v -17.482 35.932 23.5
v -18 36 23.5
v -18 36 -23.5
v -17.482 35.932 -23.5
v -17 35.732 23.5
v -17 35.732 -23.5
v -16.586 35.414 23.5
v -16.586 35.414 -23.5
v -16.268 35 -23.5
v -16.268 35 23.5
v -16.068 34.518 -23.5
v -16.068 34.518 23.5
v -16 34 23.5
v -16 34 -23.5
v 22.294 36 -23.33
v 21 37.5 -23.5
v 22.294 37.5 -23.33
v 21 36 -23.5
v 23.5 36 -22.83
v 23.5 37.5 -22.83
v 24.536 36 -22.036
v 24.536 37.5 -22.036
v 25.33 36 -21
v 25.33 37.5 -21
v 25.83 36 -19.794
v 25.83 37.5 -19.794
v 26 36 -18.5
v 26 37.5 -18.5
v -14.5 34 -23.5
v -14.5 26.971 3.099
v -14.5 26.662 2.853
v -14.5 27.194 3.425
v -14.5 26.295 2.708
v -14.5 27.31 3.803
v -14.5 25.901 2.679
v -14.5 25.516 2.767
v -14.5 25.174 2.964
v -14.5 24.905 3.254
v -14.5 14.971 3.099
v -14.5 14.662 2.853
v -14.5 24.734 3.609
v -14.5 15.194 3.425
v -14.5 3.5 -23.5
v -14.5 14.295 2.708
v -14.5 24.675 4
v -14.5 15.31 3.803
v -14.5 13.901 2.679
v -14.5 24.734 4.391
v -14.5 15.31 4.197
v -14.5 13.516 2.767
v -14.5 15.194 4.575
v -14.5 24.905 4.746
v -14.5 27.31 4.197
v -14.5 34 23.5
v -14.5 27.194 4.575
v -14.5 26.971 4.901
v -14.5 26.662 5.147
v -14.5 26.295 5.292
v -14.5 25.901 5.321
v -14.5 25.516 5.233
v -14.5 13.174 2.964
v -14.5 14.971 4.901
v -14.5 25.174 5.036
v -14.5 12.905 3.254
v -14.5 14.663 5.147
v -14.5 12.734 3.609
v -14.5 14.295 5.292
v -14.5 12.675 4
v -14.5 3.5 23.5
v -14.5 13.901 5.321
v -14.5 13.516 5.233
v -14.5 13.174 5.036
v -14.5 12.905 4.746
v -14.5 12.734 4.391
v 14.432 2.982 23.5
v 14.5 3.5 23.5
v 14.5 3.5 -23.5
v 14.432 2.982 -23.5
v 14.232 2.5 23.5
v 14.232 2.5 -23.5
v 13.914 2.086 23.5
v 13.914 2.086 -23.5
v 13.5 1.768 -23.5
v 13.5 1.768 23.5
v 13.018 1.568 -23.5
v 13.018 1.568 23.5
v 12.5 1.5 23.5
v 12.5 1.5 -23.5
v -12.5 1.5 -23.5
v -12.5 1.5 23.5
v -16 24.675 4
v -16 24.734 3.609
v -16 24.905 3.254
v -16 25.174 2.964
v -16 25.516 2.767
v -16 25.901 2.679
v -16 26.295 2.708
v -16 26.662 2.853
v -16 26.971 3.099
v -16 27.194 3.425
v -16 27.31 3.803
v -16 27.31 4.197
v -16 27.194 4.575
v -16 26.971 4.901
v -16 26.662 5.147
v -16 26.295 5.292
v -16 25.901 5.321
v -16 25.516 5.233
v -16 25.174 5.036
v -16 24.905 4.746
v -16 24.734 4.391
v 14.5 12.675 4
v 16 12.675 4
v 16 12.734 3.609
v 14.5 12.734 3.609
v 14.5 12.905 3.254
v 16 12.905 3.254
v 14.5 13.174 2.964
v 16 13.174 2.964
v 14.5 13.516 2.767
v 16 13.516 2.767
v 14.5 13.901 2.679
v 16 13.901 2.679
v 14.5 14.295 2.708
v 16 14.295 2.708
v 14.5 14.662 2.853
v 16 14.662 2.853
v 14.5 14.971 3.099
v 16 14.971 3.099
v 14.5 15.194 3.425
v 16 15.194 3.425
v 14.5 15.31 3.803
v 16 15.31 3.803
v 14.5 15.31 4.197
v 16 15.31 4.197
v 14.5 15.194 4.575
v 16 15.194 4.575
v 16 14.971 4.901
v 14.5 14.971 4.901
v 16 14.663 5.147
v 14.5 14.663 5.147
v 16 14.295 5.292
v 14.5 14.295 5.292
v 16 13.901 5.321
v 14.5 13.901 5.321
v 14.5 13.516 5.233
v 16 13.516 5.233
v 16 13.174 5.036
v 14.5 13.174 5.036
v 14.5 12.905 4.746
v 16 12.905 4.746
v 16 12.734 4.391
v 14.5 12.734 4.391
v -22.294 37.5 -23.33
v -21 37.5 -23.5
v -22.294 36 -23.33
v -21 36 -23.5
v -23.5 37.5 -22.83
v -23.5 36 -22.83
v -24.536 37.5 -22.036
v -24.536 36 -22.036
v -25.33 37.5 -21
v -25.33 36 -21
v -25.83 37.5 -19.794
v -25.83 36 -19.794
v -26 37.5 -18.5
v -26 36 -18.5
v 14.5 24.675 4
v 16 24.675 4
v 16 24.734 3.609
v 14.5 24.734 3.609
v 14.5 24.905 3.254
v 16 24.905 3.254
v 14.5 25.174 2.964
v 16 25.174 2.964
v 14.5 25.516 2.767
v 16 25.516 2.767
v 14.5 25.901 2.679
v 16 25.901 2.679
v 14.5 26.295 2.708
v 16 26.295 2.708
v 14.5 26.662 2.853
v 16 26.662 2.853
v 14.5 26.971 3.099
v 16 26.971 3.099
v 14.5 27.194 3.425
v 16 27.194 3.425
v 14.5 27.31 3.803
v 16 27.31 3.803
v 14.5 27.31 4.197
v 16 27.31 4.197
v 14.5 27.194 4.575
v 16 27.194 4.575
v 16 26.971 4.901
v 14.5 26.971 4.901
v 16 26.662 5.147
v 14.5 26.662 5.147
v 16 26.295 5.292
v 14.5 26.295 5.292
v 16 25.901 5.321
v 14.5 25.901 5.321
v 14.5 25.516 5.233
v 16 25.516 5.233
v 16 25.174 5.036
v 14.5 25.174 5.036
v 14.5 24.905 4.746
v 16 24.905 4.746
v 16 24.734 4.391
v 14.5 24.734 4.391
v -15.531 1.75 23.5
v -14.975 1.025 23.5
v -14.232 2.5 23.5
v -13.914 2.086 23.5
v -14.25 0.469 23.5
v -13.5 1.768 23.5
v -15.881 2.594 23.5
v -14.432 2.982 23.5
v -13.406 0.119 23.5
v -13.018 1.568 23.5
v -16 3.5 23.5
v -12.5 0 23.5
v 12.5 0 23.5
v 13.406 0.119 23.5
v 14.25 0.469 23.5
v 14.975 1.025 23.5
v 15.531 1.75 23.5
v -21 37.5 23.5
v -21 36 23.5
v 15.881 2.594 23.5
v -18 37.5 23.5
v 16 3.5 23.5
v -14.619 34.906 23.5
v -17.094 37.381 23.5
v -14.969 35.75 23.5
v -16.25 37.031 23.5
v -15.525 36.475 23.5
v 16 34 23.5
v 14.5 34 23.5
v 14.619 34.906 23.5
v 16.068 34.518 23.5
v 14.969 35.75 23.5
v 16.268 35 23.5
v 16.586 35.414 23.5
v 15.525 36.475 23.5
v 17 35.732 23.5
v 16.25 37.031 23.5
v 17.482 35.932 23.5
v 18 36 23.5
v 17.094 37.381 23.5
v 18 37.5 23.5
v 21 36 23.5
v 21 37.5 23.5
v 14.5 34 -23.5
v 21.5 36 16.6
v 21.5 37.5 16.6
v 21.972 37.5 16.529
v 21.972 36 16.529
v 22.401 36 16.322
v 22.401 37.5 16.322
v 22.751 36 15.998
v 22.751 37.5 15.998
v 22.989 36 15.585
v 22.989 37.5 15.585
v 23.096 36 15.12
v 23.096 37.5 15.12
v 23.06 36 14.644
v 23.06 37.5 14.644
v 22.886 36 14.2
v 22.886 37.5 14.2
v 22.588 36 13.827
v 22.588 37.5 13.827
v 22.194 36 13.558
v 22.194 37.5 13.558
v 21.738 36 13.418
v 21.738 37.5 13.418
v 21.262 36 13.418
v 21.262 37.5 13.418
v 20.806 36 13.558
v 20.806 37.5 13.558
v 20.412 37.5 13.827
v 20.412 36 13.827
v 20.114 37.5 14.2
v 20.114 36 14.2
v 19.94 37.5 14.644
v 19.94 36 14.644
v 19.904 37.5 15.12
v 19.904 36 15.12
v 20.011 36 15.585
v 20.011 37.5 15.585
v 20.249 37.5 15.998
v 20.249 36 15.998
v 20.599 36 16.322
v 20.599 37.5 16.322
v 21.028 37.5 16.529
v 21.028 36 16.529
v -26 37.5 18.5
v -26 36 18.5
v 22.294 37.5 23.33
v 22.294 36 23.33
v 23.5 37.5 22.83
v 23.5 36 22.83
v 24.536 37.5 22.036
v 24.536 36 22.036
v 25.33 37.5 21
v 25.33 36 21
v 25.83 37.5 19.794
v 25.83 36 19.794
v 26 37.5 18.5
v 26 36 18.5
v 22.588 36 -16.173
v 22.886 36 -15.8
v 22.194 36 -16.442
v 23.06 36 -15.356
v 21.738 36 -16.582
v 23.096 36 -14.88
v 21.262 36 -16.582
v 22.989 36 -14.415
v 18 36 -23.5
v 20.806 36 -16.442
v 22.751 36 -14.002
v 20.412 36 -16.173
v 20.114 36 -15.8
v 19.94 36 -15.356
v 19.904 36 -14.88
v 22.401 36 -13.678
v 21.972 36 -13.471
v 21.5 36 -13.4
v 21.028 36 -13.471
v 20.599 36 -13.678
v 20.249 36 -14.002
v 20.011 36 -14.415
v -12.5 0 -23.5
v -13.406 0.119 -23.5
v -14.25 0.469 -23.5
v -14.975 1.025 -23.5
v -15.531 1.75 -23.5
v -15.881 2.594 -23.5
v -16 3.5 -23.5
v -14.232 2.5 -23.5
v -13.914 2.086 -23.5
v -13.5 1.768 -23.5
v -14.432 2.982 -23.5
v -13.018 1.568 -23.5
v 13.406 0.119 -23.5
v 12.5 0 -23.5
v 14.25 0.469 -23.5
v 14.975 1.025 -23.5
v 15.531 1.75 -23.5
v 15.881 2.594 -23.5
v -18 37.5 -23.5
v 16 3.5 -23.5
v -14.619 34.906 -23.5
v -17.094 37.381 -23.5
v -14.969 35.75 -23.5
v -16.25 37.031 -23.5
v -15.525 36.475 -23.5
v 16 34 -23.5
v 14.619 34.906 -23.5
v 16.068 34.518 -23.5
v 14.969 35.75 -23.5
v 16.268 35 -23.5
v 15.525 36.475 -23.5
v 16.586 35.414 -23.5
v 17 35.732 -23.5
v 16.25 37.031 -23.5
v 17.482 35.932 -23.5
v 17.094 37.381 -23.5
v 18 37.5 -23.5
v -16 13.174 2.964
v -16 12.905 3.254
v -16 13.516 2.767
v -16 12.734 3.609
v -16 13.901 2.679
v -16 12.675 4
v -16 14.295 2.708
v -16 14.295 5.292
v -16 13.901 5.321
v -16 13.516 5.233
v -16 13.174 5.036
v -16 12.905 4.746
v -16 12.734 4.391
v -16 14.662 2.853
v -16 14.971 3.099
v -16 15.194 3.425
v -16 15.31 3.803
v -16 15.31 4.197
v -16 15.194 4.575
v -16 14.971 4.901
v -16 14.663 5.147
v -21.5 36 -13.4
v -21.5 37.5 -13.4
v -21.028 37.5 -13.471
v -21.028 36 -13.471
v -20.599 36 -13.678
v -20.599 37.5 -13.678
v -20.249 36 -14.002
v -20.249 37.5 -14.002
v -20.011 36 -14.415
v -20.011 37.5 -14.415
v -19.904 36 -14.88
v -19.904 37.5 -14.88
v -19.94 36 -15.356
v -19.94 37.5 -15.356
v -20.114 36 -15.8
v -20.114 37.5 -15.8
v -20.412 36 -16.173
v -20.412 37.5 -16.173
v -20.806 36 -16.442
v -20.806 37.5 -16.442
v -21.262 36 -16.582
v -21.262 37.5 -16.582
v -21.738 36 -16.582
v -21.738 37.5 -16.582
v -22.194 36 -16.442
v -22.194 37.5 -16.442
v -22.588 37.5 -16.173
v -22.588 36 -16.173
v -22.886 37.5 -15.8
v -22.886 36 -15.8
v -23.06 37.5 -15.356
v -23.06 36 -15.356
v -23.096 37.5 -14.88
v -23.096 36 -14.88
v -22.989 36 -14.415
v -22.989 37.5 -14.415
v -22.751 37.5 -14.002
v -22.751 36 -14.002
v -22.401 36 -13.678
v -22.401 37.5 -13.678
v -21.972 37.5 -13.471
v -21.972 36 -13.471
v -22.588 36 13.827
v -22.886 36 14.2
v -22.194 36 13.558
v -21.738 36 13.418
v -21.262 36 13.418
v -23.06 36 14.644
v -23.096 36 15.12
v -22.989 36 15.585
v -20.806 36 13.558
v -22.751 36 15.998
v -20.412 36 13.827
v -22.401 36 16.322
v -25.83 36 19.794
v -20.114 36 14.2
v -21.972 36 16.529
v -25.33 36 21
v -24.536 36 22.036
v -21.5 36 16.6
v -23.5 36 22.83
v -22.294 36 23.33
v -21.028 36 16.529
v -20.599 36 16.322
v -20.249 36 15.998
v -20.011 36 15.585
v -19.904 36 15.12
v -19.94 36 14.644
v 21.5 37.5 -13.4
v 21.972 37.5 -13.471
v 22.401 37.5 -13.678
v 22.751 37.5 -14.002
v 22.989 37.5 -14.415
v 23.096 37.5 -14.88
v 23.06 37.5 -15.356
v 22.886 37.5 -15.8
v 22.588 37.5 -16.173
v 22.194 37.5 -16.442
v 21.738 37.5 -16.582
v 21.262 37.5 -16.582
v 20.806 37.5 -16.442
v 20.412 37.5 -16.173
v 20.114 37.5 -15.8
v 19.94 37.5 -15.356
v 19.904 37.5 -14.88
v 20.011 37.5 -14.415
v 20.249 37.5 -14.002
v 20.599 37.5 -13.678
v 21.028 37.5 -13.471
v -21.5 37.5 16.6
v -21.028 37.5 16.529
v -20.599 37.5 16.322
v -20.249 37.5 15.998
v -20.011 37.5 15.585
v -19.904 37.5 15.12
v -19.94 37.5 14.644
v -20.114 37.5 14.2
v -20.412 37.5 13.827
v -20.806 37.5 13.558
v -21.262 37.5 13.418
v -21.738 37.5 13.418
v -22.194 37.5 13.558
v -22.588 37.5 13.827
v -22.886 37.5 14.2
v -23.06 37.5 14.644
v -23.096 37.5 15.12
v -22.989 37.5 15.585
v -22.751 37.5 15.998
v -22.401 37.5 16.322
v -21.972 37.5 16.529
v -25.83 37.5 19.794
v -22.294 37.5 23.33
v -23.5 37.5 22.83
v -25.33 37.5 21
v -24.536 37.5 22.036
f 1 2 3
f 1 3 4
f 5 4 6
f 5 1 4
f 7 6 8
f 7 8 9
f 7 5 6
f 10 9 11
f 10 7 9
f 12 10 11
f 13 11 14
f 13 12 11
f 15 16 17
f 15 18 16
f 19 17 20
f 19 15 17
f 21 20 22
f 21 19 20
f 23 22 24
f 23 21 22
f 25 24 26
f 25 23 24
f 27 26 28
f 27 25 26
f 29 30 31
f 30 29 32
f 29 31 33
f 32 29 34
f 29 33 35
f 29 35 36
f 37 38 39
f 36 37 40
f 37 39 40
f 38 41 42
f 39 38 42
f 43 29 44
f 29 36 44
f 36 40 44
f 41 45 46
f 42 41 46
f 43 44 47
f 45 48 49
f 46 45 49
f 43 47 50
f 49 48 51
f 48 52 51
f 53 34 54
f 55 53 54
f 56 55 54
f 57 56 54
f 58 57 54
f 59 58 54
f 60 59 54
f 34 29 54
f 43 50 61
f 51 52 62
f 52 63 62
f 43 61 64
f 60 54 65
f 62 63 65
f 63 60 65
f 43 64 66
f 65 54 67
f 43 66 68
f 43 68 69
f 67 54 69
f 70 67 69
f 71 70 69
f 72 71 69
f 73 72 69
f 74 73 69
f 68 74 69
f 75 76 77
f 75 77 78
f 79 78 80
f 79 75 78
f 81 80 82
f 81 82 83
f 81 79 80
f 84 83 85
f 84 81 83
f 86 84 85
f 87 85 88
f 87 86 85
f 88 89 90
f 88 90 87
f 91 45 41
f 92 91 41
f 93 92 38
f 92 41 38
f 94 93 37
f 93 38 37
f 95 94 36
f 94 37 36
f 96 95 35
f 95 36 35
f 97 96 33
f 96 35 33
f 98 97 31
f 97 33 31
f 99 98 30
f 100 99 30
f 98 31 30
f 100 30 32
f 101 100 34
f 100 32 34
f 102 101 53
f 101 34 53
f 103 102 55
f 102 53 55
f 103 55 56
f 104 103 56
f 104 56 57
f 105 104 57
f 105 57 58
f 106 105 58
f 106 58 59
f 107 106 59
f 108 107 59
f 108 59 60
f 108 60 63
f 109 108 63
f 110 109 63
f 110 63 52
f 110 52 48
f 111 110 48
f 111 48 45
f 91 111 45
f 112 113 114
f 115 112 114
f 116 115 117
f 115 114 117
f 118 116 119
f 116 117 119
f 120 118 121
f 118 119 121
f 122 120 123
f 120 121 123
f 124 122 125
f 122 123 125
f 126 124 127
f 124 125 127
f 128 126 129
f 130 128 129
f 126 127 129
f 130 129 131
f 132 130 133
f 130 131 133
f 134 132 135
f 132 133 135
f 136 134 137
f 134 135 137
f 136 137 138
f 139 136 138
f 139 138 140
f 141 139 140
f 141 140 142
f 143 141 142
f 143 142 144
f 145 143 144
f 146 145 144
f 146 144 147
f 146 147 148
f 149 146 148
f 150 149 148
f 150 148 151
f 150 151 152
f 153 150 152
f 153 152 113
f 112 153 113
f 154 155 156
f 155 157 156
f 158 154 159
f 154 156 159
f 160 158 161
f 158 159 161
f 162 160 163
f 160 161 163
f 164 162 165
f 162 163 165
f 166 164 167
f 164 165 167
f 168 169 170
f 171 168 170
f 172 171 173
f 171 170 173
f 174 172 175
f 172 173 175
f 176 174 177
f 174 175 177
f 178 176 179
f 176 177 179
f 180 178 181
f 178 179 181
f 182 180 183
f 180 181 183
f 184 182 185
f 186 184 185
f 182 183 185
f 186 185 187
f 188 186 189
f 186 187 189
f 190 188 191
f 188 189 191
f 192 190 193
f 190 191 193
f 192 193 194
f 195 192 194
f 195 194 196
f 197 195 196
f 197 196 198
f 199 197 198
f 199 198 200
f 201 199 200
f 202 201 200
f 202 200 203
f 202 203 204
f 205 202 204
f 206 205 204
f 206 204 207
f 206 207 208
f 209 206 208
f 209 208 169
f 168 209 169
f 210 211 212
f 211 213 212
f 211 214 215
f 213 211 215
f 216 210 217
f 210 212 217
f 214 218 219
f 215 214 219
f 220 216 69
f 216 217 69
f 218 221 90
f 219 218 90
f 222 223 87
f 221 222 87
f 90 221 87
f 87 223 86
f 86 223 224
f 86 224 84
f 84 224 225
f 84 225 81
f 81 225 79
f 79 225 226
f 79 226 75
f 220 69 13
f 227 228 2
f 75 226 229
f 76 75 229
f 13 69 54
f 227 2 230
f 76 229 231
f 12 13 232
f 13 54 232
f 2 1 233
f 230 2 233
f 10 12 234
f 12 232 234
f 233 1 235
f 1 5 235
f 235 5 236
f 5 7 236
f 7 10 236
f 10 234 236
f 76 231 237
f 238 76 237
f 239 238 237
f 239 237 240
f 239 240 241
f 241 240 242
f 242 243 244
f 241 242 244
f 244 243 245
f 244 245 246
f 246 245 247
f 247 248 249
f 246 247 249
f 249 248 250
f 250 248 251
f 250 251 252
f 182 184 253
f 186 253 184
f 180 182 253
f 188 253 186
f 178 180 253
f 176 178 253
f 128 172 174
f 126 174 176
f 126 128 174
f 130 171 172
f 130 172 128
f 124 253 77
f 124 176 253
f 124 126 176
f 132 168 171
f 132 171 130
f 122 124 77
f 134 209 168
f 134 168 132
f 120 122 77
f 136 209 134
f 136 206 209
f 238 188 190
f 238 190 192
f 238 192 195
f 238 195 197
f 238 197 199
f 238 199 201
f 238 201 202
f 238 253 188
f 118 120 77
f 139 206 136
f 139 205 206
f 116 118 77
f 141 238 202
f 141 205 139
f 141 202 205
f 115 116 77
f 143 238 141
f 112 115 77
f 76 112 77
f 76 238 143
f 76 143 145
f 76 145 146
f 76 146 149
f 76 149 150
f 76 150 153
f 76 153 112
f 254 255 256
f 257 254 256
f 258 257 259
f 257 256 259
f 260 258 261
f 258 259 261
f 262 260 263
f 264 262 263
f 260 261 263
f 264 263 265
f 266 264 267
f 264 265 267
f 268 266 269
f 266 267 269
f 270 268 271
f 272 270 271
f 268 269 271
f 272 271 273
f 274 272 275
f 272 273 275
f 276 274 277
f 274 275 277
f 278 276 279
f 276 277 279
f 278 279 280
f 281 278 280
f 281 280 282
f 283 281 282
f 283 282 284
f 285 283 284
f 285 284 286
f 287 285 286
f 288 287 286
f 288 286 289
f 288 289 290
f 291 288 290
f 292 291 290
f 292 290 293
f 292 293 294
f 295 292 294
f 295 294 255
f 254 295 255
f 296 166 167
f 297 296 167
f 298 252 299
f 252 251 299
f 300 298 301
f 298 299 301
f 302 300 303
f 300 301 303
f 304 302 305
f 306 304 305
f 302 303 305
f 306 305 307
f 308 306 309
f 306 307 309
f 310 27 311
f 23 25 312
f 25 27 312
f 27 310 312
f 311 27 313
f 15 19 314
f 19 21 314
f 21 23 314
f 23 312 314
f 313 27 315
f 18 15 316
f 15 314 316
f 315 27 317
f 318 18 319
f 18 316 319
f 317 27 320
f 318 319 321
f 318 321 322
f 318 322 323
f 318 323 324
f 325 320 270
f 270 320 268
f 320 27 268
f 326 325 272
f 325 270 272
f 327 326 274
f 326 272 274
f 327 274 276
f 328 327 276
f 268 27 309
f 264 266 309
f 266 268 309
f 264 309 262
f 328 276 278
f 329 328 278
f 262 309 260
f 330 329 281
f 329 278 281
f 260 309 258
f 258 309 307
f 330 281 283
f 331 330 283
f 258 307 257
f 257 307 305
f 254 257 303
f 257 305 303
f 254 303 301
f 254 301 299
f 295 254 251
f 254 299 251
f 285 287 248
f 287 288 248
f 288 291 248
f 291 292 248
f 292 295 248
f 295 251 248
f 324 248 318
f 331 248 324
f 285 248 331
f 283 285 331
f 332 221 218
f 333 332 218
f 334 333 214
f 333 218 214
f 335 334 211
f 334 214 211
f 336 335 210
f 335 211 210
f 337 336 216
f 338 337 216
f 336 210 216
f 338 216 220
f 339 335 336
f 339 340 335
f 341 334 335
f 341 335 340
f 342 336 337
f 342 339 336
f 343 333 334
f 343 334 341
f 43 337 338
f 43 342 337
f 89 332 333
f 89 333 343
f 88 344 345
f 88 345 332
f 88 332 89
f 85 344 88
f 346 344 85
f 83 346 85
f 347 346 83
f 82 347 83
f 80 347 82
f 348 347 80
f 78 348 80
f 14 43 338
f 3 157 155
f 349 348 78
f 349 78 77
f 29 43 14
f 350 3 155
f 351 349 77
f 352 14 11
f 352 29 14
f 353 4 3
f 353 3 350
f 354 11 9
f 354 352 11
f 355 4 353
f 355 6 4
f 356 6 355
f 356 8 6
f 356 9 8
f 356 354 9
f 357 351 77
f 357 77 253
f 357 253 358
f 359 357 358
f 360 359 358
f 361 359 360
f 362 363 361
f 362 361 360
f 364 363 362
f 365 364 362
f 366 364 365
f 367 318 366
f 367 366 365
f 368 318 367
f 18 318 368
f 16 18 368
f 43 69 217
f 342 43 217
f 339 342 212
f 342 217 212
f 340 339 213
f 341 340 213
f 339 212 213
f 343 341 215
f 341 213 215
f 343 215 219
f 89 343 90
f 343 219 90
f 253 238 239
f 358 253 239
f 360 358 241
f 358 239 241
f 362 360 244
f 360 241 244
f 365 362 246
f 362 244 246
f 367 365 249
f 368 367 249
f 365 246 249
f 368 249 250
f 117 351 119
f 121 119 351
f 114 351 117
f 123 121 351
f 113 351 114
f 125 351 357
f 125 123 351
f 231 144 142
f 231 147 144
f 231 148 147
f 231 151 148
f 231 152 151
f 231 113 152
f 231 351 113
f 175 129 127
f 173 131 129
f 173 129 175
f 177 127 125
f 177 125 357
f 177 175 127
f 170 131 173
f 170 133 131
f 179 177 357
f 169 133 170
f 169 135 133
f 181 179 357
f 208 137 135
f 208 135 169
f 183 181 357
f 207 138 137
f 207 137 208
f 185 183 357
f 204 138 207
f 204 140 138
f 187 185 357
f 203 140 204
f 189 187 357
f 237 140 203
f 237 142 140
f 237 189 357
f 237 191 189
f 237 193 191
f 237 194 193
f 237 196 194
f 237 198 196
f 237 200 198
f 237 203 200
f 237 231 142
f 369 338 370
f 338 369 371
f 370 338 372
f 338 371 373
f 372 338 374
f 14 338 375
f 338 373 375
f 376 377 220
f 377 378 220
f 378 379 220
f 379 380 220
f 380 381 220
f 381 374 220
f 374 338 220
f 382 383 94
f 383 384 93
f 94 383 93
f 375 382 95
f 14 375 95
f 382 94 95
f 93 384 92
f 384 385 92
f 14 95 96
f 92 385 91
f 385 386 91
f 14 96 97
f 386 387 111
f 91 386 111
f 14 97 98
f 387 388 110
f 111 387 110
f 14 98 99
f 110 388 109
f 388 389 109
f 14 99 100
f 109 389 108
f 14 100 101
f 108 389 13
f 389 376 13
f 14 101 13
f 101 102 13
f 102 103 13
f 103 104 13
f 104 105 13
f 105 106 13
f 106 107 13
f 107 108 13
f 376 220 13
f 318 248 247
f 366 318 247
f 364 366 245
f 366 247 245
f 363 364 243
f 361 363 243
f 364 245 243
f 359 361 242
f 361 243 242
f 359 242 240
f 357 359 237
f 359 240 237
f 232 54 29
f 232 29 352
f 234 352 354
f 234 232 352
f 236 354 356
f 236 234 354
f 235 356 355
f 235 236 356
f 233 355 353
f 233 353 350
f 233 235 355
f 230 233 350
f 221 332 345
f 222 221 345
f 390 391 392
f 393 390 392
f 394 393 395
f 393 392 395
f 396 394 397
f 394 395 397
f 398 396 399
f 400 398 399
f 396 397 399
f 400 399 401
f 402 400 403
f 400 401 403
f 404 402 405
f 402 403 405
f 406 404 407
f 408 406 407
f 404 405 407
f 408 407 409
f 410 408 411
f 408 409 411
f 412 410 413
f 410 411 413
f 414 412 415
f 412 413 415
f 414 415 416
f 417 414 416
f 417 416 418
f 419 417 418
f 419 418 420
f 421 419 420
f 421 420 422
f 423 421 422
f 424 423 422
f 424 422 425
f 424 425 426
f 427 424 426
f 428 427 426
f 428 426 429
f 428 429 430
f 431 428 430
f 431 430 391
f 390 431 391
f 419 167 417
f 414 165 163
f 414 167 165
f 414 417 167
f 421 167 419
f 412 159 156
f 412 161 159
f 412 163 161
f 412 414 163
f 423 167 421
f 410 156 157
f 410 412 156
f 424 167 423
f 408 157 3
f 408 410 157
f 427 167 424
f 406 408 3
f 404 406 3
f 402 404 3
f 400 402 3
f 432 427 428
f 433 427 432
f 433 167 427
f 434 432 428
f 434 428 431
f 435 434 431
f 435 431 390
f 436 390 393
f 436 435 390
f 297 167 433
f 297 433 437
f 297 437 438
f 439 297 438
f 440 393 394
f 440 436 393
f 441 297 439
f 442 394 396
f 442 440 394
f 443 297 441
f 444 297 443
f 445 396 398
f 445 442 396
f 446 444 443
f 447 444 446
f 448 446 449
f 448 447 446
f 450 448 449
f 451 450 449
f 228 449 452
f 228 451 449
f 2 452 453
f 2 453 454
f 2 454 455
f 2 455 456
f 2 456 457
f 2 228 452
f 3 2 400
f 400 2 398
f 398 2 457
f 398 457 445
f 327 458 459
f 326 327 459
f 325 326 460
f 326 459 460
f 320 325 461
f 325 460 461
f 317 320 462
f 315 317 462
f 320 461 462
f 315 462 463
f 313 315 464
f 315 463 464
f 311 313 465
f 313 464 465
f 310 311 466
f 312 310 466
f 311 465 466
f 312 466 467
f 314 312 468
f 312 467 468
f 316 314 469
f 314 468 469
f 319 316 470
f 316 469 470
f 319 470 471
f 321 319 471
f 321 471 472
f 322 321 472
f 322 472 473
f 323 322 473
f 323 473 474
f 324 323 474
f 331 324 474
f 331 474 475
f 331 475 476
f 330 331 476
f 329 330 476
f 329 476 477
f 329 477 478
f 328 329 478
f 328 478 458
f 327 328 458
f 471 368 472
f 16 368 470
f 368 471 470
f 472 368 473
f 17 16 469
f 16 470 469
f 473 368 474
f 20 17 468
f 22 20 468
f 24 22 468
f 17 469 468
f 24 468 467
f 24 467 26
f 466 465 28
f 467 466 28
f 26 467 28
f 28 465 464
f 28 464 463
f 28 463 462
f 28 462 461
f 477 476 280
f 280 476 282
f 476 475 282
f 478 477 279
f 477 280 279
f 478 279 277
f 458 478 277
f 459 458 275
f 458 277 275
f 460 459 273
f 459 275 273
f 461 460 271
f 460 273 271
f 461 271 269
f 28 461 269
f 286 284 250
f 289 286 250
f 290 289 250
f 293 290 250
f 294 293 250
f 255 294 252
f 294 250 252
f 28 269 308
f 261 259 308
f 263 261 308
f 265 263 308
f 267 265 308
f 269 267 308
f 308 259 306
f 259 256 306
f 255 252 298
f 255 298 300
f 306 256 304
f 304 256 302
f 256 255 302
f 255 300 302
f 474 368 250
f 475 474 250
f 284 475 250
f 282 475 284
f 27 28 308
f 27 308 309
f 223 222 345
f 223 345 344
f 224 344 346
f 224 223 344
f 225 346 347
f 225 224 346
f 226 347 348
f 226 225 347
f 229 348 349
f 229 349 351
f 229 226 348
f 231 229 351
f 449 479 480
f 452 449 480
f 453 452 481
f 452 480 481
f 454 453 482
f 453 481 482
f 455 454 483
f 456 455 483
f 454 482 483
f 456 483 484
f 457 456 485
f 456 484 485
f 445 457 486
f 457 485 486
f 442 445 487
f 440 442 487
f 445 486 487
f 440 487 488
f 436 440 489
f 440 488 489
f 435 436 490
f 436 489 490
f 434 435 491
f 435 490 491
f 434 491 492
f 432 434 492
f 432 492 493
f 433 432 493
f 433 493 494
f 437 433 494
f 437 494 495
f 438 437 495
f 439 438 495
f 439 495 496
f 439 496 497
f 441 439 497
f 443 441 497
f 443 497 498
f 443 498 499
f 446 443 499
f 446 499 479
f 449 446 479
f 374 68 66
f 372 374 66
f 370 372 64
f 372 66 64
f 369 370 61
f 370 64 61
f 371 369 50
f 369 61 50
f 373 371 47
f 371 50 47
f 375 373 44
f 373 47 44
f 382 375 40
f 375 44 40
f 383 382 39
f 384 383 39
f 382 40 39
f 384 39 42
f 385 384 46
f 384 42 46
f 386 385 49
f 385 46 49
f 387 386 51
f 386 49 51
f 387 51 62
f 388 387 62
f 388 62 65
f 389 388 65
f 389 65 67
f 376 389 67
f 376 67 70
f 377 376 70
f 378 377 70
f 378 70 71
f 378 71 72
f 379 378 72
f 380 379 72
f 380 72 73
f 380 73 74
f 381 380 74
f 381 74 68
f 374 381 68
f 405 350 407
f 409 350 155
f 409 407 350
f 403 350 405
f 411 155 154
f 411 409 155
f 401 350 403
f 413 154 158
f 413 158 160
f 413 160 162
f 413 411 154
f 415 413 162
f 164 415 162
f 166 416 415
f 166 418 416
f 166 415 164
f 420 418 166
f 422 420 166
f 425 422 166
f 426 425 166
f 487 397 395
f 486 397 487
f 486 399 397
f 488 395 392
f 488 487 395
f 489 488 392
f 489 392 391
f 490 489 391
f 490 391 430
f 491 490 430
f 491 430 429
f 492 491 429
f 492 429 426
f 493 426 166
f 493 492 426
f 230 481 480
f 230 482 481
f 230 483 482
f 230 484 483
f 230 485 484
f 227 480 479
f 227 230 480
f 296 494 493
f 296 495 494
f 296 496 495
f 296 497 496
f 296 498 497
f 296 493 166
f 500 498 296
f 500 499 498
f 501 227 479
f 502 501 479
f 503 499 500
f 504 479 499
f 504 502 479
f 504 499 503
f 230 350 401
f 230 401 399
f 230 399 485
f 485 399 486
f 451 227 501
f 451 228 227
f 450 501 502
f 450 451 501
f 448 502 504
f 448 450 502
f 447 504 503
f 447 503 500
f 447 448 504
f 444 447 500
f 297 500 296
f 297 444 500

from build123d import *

# Parameters (mm, degrees)
SKETCH1_W                    = 29
SKETCH1_H                    = 47
BASE_FLANGE1_DEPTH           = 1.5
EDGE_FLANGE1_STRIP_W         = 10
EDGE_FLANGE1_STRIP_H         = 1.5
EDGE_FLANGE1_STRIP_CUT_DEPTH = 47
EDGE_FLANGE1_DEPTH           = 47
EDGE_FLANGE2_STRIP_W         = 10
EDGE_FLANGE2_STRIP_H         = 1.5
EDGE_FLANGE2_STRIP_CUT_DEPTH = 47
EDGE_FLANGE2_DEPTH           = 47
SKETCH12_R                   = 1.6
CUT_EXTRUDE1_DEPTH           = 10
SKETCH13_R                   = 1.325
CUT_EXTRUDE2_DEPTH           = 62.012293843
FILLET1_R                    = 5


# Sheet-metal steps are written as plain solids
with BuildPart() as part:
    # Sketch1 → Base-Flange1 (new body)
    with BuildSketch(Plane(origin=(0, 0, 0), x_dir=(1, 0, 0), z_dir=(0, 1, 0))):
        Rectangle(SKETCH1_W, SKETCH1_H)
    extrude(amount=BASE_FLANGE1_DEPTH)

    # Edge-Flange1 strip (across the edge) → Edge-Flange1 strip cut (cut)
    with BuildSketch(Plane(origin=(14.5, 1.5, 23.5), x_dir=(-1, 0, 0), z_dir=(0, 0, -1))):
        with Locations((-3, -0.75)):
            Rectangle(EDGE_FLANGE1_STRIP_W, EDGE_FLANGE1_STRIP_H)
    edge_flange1_strip_cut = extrude(amount=EDGE_FLANGE1_STRIP_CUT_DEPTH, mode=Mode.SUBTRACT)

    # Edge-Flange1 section (across the edge) → Edge-Flange1 (add)
    with BuildSketch(Plane(origin=(14.5, 1.5, 23.5), x_dir=(-1, 0, 0), z_dir=(0, 0, -1))):
        with BuildLine():
            Line((-1.5, 2), (-1.5, 36))
            Line((-1.5, 36), (0, 36))
            Line((0, 36), (0, 2))
            ThreePointArc((0, 2), (0.585786438, 0.585786438), (2, 0))
            Line((2, 0), (2, -1.5))
            ThreePointArc((2, -1.5), (-0.474873734, -0.474873734), (-1.5, 2))
        make_face()
    edge_flange1 = extrude(amount=EDGE_FLANGE1_DEPTH)

    # Mirror1: Edge-Flange1 strip cut, Edge-Flange1 across plane
    add(edge_flange1_strip_cut.mirror(Plane(origin=(0, 0, 0), x_dir=(0, 0, 1), z_dir=(1, 0, 0))), mode=Mode.SUBTRACT)
    add(edge_flange1.mirror(Plane(origin=(0, 0, 0), x_dir=(0, 0, 1), z_dir=(1, 0, 0))))

    # Edge-Flange2 strip (across the edge) → Edge-Flange2 strip cut (cut)
    with BuildSketch(Plane(origin=(-16, 37.5, 23.5), x_dir=(0, -1, 0), z_dir=(0, 0, -1))):
        with Locations((-1.5, -0.75)):
            Rectangle(EDGE_FLANGE2_STRIP_W, EDGE_FLANGE2_STRIP_H)
    edge_flange2_strip_cut = extrude(amount=EDGE_FLANGE2_STRIP_CUT_DEPTH, mode=Mode.SUBTRACT)

    # Edge-Flange2 section (across the edge) → Edge-Flange2 (add)
    with BuildSketch(Plane(origin=(-16, 37.5, 23.5), x_dir=(0, -1, 0), z_dir=(0, 0, -1))):
        with BuildLine():
            Line((0, 2), (0, 10))
            Line((0, 10), (1.5, 10))
            Line((1.5, 10), (1.5, 2))
            ThreePointArc((1.5, 2), (2.085786438, 0.585786438), (3.5, 0))
            Line((3.5, 0), (3.5, -1.5))
            ThreePointArc((3.5, -1.5), (1.025126266, -0.474873734), (0, 2))
        make_face()
    edge_flange2 = extrude(amount=EDGE_FLANGE2_DEPTH)

    # Mirror2: Edge-Flange2 strip cut, Edge-Flange2 across plane
    add(edge_flange2_strip_cut.mirror(Plane(origin=(0, 0, 0), x_dir=(0, 0, 1), z_dir=(1, 0, 0))), mode=Mode.SUBTRACT)
    add(edge_flange2.mirror(Plane(origin=(0, 0, 0), x_dir=(0, 0, 1), z_dir=(1, 0, 0))))

    # Sketch12 → Cut-Extrude1 (cut)
    with BuildSketch(Plane(origin=(0, 37.5, 0), x_dir=(1, 0, 0), z_dir=(0, 1, 0))):
        with Locations(Location((21.5, 15, 0), (0, 0, 270))):
            Circle(SKETCH12_R)
        with Locations(Location((-21.5, 15, 0), (0, 0, 270))):
            Circle(SKETCH12_R)
        with Locations(Location((-21.5, -15, 0), (0, 0, 270))):
            Circle(SKETCH12_R)
        with Locations(Location((21.5, -15, 0), (0, 0, 270))):
            Circle(SKETCH12_R)
    extrude(amount=-CUT_EXTRUDE1_DEPTH, mode=Mode.SUBTRACT)

    # Sketch13 → Cut-Extrude2 (cut, through all)
    with BuildSketch(Plane(origin=(16, 0, 0), x_dir=(0, 0, -1), z_dir=(1, 0, 0))):
        with Locations(Location((-4, 26, 0), (0, 0, 270))):
            Circle(SKETCH13_R)
        with Locations(Location((-4, 14, 0), (0, 0, 270))):
            Circle(SKETCH13_R)
    extrude(amount=-CUT_EXTRUDE2_DEPTH, mode=Mode.SUBTRACT)

    # Fillet1
    fillet1_edges = [part.edges().sort_by_distance(p)[0] for p in [
        (-26, 36.75, 23.5),
        (-26, 36.75, -23.5),
        (26, 36.75, -23.5),
        (26, 36.75, 23.5),
    ]]
    fillet(fillet1_edges, radius=FILLET1_R)


solid = part.part
